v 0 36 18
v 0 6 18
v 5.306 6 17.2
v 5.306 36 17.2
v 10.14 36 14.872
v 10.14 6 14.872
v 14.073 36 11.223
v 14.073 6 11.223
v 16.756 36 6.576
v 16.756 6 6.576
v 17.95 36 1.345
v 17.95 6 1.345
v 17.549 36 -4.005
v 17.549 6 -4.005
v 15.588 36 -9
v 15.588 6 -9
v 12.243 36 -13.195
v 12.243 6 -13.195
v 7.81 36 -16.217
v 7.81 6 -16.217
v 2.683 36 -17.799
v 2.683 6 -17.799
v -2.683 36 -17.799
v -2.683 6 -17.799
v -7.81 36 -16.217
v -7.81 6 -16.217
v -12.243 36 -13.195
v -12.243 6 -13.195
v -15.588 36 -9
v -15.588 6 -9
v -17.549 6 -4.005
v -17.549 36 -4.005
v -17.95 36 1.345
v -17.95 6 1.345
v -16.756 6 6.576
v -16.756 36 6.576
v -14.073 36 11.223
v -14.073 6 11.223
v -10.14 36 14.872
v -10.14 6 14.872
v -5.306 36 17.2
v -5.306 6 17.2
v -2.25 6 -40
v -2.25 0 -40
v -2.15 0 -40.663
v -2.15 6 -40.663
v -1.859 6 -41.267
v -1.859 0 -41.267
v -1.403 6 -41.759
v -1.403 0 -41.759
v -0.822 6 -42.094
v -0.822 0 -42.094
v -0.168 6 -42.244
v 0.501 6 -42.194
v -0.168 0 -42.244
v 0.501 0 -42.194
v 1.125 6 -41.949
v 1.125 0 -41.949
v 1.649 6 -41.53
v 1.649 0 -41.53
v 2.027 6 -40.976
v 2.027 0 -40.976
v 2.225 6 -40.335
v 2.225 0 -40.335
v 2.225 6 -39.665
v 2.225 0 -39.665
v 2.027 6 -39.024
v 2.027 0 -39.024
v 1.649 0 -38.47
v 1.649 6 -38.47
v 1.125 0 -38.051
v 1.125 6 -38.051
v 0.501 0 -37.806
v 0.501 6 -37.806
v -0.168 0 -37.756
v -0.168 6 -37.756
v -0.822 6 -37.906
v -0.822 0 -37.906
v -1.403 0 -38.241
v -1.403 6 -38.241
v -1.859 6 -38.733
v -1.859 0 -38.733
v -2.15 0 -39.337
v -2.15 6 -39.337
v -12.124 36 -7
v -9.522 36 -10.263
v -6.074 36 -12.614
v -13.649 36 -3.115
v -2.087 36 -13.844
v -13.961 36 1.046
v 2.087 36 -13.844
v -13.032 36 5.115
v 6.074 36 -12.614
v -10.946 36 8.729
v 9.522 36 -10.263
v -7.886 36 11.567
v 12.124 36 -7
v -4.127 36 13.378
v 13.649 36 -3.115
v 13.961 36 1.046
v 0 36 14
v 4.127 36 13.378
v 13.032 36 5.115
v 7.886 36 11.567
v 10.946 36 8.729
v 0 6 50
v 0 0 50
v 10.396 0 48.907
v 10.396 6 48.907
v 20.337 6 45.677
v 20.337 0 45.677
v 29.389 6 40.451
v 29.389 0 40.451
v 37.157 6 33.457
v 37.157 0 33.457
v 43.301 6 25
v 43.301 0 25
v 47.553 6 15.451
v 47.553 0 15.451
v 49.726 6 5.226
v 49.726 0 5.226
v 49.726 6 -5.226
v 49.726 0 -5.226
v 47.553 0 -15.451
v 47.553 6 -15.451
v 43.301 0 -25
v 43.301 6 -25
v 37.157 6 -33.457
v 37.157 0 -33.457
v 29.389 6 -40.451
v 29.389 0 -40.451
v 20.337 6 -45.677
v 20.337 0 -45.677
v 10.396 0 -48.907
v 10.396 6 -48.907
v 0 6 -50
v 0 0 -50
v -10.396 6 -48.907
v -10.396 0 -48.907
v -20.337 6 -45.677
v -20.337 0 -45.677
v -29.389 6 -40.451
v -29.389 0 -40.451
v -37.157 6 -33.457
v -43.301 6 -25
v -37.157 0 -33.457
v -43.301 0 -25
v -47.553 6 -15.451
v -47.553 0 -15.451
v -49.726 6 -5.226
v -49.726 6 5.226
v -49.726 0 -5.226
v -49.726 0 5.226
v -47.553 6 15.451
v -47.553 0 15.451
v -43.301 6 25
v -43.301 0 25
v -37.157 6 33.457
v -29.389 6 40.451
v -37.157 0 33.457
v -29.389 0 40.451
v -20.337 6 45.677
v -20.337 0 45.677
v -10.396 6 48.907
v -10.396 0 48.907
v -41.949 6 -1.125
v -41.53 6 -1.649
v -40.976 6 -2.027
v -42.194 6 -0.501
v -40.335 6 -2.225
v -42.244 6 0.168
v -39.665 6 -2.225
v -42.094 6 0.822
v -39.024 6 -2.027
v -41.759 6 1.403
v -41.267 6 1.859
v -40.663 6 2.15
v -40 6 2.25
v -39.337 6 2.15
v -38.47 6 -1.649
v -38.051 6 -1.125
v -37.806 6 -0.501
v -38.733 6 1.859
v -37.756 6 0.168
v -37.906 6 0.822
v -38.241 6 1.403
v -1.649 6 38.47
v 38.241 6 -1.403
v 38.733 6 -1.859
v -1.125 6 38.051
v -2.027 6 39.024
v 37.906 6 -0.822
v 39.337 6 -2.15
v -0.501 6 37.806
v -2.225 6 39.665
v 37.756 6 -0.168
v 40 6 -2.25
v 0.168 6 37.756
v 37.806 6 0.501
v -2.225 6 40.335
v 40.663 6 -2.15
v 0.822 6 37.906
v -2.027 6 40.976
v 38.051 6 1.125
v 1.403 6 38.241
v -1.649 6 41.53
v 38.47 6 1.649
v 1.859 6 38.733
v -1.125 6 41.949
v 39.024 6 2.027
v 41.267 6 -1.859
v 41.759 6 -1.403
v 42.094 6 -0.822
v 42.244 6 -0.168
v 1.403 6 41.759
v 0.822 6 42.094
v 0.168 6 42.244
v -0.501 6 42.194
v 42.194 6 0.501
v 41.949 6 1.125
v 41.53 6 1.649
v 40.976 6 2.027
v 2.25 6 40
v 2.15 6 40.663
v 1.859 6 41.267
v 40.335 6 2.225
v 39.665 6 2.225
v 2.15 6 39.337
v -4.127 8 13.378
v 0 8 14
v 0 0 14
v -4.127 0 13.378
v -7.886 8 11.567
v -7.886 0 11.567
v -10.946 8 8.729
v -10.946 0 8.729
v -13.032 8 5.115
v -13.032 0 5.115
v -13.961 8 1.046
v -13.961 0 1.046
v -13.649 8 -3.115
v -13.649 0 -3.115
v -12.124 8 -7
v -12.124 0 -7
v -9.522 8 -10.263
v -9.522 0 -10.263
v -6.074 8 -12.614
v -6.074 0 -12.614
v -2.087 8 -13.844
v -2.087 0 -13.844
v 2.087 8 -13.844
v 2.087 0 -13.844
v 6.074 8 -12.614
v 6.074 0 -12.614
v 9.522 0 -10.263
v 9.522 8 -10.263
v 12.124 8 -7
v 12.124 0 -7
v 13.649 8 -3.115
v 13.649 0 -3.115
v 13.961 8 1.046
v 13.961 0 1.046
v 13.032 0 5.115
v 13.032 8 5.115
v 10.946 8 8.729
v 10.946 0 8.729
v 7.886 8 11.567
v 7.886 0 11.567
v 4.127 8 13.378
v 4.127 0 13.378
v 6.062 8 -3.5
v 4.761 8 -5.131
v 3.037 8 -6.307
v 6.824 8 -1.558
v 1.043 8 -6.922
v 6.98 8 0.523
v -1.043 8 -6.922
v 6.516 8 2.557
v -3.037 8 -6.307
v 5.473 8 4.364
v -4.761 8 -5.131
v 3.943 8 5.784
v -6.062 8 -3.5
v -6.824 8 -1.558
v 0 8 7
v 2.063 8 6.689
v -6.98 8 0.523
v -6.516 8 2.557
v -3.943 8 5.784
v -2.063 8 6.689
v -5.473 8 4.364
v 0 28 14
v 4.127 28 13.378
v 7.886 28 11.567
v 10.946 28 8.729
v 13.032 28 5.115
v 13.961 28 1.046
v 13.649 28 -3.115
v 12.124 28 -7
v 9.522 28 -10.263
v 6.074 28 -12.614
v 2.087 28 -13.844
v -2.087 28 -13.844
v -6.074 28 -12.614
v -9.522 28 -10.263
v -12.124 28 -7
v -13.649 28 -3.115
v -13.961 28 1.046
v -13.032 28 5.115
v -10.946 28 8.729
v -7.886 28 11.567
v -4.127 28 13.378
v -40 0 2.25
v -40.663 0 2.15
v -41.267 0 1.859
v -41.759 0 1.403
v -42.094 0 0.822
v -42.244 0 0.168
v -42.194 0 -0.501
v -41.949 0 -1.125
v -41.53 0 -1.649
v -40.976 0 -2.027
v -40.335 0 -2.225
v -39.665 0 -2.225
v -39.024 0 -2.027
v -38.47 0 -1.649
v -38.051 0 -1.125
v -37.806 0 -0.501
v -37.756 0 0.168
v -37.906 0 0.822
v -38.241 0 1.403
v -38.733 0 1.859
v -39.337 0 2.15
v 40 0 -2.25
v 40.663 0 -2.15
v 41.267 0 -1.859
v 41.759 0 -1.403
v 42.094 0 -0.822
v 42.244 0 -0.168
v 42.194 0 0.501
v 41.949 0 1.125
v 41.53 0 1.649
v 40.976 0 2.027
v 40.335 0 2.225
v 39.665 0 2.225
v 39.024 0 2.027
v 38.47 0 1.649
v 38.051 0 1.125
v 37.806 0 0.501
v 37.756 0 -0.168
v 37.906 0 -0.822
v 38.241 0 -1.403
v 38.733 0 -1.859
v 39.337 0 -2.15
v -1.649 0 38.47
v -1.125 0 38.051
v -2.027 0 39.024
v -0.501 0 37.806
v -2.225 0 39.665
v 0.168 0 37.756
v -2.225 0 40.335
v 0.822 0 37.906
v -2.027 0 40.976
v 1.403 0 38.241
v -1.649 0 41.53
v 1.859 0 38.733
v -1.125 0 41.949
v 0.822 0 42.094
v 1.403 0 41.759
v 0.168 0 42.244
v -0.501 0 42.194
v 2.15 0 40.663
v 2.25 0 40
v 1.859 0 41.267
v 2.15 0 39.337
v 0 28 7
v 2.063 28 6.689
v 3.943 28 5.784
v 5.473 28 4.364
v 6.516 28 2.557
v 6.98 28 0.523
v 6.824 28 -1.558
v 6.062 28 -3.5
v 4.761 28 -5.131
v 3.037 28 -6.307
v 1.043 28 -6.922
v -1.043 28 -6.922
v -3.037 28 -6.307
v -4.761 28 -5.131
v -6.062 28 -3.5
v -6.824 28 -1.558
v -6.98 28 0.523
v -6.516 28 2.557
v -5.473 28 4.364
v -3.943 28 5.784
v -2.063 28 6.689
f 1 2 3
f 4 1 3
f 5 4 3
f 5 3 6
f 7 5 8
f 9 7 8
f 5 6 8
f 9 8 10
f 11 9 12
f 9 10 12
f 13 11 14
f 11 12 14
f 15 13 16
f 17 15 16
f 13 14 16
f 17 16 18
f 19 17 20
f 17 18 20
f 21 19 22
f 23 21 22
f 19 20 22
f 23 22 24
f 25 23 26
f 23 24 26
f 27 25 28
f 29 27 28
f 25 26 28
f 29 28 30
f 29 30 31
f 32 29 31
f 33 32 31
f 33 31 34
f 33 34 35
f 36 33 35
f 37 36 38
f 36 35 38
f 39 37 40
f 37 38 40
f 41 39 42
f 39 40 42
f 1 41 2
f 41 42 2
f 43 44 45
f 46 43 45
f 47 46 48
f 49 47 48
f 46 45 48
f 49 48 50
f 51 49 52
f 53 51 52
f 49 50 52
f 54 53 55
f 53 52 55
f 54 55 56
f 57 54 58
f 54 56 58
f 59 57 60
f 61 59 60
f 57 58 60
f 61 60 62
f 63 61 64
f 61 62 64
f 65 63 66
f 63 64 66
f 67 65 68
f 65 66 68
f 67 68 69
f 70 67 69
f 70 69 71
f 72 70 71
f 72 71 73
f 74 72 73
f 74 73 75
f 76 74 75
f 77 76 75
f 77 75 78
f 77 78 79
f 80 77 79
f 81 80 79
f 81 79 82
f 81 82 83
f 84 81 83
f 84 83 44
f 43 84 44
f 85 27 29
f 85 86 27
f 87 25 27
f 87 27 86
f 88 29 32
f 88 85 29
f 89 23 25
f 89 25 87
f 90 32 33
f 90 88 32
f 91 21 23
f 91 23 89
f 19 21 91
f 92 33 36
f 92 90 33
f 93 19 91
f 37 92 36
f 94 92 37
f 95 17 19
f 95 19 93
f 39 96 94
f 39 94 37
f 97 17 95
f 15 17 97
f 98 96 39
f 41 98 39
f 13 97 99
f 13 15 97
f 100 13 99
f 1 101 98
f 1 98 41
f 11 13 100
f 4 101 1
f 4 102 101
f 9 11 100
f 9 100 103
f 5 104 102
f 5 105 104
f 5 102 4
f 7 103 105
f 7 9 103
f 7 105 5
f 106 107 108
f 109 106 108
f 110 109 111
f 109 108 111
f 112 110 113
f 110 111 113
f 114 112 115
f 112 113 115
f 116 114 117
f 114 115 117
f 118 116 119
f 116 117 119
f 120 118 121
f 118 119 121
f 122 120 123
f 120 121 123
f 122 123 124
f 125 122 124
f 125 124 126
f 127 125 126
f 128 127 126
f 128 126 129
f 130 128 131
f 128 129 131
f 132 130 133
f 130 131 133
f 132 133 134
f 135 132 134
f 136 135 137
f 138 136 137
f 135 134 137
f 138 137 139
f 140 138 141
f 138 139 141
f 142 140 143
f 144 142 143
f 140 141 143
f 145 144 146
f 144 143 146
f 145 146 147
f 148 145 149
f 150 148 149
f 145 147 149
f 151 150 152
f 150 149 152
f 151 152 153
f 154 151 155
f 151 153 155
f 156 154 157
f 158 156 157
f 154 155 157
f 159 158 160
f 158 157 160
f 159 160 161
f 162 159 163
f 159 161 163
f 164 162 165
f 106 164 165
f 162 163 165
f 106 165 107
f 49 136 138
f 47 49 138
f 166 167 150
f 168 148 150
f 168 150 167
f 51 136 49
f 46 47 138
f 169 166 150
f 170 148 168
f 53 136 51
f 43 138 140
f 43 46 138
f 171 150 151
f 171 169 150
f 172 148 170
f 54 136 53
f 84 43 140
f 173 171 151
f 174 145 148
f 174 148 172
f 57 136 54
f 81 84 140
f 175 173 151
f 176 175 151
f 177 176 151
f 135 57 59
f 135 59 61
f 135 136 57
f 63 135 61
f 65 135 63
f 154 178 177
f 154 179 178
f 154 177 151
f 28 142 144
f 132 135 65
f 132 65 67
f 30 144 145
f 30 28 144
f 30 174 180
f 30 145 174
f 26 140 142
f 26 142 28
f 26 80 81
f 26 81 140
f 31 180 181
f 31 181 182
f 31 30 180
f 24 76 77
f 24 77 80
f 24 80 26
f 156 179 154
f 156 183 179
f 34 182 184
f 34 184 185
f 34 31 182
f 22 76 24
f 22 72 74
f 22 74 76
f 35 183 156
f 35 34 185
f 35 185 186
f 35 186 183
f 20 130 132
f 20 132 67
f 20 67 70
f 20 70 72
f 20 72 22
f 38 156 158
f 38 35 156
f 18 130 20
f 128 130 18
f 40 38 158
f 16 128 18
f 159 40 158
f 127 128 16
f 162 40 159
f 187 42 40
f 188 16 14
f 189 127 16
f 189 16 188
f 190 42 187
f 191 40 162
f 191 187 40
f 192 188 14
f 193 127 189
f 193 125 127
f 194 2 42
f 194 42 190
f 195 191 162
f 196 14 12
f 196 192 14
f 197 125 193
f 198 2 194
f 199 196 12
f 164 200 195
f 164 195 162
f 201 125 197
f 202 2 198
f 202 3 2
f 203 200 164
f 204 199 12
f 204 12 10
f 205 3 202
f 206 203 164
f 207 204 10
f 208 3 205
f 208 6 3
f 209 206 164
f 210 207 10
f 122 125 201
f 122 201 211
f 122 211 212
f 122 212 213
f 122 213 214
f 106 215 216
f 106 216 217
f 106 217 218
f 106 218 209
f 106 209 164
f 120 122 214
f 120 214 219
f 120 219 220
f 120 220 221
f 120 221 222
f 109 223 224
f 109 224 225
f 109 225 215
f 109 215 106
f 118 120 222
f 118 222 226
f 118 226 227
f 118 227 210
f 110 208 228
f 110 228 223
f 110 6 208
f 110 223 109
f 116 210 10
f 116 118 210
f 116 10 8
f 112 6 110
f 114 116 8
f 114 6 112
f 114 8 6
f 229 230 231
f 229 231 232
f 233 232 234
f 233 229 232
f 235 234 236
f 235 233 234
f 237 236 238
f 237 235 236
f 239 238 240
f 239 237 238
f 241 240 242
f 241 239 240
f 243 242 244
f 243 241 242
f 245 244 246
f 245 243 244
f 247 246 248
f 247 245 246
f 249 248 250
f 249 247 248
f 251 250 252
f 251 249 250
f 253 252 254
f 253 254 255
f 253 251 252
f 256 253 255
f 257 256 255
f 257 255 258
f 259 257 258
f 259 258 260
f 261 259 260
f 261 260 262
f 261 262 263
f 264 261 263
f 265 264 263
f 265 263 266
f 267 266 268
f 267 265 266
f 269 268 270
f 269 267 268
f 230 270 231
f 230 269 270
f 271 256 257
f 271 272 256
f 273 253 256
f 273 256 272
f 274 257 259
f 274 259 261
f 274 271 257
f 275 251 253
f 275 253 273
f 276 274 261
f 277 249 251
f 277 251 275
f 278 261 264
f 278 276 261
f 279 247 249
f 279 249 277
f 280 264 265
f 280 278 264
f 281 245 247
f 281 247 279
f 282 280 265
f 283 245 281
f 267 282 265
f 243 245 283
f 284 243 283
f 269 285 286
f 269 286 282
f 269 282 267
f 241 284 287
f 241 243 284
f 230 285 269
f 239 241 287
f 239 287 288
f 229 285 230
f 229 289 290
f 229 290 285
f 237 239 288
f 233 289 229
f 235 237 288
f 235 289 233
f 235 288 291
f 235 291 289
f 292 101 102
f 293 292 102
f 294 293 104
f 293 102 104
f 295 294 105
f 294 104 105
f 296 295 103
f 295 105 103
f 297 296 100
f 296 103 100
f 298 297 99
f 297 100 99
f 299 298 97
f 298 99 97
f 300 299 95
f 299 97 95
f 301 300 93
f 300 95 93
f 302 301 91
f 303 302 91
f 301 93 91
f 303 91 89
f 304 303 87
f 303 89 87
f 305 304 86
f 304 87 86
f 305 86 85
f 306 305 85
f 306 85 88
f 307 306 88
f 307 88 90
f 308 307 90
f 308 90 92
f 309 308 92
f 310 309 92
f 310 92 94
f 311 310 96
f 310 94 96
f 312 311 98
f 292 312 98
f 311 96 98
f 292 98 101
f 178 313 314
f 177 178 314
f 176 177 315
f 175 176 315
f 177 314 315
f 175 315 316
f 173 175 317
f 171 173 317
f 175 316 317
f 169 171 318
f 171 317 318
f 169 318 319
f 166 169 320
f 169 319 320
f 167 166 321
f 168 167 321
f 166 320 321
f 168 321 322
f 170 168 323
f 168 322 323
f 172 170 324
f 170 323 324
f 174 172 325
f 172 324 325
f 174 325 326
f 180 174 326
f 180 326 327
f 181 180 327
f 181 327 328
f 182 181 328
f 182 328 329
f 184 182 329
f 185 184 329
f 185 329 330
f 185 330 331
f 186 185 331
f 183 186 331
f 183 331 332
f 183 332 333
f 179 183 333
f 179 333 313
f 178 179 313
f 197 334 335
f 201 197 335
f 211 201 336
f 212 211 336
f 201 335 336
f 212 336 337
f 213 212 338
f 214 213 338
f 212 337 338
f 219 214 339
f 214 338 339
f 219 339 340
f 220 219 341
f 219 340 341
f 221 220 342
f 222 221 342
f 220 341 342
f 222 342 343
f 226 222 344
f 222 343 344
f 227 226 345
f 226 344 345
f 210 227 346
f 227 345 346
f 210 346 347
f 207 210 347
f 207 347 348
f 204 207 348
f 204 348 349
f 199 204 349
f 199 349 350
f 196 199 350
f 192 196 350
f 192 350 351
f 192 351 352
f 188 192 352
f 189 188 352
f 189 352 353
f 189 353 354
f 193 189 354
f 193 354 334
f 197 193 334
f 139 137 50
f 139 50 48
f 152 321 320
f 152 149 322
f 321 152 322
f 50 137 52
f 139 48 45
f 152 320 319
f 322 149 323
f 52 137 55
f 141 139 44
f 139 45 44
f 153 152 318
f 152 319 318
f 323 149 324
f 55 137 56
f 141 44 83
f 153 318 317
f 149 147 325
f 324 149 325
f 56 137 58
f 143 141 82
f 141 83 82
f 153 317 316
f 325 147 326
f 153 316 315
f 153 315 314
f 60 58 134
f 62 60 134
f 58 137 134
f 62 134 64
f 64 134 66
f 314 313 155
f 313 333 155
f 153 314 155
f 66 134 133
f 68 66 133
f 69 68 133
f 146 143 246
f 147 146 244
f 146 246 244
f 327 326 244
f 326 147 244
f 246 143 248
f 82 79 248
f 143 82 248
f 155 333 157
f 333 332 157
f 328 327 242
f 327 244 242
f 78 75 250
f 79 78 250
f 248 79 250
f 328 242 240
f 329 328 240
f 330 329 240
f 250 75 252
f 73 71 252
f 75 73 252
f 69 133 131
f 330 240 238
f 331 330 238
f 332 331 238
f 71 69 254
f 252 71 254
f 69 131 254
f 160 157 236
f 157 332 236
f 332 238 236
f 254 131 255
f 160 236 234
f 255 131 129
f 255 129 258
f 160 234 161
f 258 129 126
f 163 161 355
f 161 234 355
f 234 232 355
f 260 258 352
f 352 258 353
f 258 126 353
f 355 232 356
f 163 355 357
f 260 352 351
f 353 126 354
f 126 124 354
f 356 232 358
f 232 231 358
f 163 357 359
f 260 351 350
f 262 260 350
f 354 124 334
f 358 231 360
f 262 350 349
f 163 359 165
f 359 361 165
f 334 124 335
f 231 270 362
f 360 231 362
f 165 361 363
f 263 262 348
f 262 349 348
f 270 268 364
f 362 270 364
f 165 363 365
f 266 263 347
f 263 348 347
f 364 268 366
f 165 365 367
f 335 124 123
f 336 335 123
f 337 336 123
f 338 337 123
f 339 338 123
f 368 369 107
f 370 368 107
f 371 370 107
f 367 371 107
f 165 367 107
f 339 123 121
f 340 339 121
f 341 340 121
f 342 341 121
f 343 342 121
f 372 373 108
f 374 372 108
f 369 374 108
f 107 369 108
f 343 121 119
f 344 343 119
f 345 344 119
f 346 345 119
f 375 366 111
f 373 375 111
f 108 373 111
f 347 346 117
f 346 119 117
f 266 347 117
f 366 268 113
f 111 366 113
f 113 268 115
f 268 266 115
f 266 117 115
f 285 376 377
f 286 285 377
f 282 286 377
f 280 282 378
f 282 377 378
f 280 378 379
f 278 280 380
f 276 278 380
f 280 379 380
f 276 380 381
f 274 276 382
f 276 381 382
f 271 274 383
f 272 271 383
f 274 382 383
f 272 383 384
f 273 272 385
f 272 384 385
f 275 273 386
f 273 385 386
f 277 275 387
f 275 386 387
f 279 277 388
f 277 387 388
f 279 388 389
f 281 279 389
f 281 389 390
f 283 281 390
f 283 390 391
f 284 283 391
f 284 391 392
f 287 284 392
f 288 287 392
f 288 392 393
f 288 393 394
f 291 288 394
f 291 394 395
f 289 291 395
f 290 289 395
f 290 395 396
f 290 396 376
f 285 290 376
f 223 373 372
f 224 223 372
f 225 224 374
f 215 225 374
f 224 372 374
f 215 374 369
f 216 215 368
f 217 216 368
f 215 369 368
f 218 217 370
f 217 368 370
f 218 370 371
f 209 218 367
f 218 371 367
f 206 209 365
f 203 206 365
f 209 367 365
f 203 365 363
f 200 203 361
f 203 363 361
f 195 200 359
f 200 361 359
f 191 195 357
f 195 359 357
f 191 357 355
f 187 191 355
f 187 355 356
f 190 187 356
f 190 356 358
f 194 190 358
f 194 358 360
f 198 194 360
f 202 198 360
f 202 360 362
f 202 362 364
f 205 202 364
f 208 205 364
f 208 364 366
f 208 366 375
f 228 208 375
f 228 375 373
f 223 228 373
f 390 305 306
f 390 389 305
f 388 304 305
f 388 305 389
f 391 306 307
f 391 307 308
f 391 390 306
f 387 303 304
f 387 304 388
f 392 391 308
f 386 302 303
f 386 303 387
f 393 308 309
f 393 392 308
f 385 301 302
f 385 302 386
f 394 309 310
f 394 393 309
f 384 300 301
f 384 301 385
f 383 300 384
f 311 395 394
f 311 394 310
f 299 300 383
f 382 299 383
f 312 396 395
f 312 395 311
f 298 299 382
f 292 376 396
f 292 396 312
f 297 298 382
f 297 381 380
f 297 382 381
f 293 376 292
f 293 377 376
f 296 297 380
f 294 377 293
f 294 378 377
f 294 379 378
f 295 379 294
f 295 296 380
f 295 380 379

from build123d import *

# Parameters (mm, degrees)
SKETCH2_R           = 50
BOSS_EXTRUDE1_DEPTH = 6
SKETCH3_R           = 18
BOSS_EXTRUDE2_DEPTH = 30
SKETCH4_R           = 7
CUT_EXTRUDE1_DEPTH  = 80.3473377
SKETCH5_R           = 14
CUT_EXTRUDE2_DEPTH  = 8
CUT_EXTRUDE3_START  = -8
SKETCH6_R           = 14
CUT_EXTRUDE3_DEPTH  = 8
SKETCH7_R           = 2.25
CUT_EXTRUDE4_DEPTH  = 80.3473377
CIRPATTERN1_COUNT   = 4


with BuildPart() as part:
    # Sketch2 → Boss-Extrude1 (new body)
    with BuildSketch(Plane(origin=(0, 0, 0), x_dir=(1, 0, 0), z_dir=(0, 1, 0))):
        with Locations(Location((0, 0, 0), (0, 0, 270))):
            Circle(SKETCH2_R)
    extrude(amount=BOSS_EXTRUDE1_DEPTH)

    # Sketch3 → Boss-Extrude2 (add)
    with BuildSketch(Plane(origin=(0, 6, 0), x_dir=(1, 0, 0), z_dir=(0, 1, 0))):
        with Locations(Location((0, 0, 0), (0, 0, 270))):
            Circle(SKETCH3_R)
    extrude(amount=BOSS_EXTRUDE2_DEPTH)

    # Sketch4 → Cut-Extrude1 (cut, through all)
    with BuildSketch(Plane(origin=(0, 36, 0), x_dir=(1, 0, 0), z_dir=(0, 1, 0))):
        with Locations(Location((0, 0, 0), (0, 0, 270))):
            Circle(SKETCH4_R)
    extrude(amount=-CUT_EXTRUDE1_DEPTH, mode=Mode.SUBTRACT)

    # Sketch5 → Cut-Extrude2 (cut)
    with BuildSketch(Plane(origin=(0, 36, 0), x_dir=(1, 0, 0), z_dir=(0, 1, 0))):
        with Locations(Location((0, 0, 0), (0, 0, 270))):
            Circle(SKETCH5_R)
    extrude(amount=-CUT_EXTRUDE2_DEPTH, mode=Mode.SUBTRACT)

    # Sketch6 → Cut-Extrude3 (cut)
    with BuildSketch(Plane.XZ.offset(CUT_EXTRUDE3_START)):
        with Locations(Location((0, 0, 0), (0, 0, 90))):
            Circle(SKETCH6_R)
    extrude(amount=CUT_EXTRUDE3_DEPTH, mode=Mode.SUBTRACT)

    # Sketch7 → Cut-Extrude4 (cut, through all)
    with BuildSketch(Plane.XZ):
        with Locations(Location((40, 0, 0), (0, 0, 270))):
            Circle(SKETCH7_R)
    cut_extrude4 = extrude(amount=-CUT_EXTRUDE4_DEPTH, mode=Mode.SUBTRACT)

    # CirPattern1: Cut-Extrude4 ×4 about axis
    cirpattern1_axis = Axis((0, 0, 0), (0, 1, 0))
    for i in range(1, CIRPATTERN1_COUNT):
        add(cut_extrude4.rotate(cirpattern1_axis, i * 360 / CIRPATTERN1_COUNT), mode=Mode.SUBTRACT)


solid = part.part
